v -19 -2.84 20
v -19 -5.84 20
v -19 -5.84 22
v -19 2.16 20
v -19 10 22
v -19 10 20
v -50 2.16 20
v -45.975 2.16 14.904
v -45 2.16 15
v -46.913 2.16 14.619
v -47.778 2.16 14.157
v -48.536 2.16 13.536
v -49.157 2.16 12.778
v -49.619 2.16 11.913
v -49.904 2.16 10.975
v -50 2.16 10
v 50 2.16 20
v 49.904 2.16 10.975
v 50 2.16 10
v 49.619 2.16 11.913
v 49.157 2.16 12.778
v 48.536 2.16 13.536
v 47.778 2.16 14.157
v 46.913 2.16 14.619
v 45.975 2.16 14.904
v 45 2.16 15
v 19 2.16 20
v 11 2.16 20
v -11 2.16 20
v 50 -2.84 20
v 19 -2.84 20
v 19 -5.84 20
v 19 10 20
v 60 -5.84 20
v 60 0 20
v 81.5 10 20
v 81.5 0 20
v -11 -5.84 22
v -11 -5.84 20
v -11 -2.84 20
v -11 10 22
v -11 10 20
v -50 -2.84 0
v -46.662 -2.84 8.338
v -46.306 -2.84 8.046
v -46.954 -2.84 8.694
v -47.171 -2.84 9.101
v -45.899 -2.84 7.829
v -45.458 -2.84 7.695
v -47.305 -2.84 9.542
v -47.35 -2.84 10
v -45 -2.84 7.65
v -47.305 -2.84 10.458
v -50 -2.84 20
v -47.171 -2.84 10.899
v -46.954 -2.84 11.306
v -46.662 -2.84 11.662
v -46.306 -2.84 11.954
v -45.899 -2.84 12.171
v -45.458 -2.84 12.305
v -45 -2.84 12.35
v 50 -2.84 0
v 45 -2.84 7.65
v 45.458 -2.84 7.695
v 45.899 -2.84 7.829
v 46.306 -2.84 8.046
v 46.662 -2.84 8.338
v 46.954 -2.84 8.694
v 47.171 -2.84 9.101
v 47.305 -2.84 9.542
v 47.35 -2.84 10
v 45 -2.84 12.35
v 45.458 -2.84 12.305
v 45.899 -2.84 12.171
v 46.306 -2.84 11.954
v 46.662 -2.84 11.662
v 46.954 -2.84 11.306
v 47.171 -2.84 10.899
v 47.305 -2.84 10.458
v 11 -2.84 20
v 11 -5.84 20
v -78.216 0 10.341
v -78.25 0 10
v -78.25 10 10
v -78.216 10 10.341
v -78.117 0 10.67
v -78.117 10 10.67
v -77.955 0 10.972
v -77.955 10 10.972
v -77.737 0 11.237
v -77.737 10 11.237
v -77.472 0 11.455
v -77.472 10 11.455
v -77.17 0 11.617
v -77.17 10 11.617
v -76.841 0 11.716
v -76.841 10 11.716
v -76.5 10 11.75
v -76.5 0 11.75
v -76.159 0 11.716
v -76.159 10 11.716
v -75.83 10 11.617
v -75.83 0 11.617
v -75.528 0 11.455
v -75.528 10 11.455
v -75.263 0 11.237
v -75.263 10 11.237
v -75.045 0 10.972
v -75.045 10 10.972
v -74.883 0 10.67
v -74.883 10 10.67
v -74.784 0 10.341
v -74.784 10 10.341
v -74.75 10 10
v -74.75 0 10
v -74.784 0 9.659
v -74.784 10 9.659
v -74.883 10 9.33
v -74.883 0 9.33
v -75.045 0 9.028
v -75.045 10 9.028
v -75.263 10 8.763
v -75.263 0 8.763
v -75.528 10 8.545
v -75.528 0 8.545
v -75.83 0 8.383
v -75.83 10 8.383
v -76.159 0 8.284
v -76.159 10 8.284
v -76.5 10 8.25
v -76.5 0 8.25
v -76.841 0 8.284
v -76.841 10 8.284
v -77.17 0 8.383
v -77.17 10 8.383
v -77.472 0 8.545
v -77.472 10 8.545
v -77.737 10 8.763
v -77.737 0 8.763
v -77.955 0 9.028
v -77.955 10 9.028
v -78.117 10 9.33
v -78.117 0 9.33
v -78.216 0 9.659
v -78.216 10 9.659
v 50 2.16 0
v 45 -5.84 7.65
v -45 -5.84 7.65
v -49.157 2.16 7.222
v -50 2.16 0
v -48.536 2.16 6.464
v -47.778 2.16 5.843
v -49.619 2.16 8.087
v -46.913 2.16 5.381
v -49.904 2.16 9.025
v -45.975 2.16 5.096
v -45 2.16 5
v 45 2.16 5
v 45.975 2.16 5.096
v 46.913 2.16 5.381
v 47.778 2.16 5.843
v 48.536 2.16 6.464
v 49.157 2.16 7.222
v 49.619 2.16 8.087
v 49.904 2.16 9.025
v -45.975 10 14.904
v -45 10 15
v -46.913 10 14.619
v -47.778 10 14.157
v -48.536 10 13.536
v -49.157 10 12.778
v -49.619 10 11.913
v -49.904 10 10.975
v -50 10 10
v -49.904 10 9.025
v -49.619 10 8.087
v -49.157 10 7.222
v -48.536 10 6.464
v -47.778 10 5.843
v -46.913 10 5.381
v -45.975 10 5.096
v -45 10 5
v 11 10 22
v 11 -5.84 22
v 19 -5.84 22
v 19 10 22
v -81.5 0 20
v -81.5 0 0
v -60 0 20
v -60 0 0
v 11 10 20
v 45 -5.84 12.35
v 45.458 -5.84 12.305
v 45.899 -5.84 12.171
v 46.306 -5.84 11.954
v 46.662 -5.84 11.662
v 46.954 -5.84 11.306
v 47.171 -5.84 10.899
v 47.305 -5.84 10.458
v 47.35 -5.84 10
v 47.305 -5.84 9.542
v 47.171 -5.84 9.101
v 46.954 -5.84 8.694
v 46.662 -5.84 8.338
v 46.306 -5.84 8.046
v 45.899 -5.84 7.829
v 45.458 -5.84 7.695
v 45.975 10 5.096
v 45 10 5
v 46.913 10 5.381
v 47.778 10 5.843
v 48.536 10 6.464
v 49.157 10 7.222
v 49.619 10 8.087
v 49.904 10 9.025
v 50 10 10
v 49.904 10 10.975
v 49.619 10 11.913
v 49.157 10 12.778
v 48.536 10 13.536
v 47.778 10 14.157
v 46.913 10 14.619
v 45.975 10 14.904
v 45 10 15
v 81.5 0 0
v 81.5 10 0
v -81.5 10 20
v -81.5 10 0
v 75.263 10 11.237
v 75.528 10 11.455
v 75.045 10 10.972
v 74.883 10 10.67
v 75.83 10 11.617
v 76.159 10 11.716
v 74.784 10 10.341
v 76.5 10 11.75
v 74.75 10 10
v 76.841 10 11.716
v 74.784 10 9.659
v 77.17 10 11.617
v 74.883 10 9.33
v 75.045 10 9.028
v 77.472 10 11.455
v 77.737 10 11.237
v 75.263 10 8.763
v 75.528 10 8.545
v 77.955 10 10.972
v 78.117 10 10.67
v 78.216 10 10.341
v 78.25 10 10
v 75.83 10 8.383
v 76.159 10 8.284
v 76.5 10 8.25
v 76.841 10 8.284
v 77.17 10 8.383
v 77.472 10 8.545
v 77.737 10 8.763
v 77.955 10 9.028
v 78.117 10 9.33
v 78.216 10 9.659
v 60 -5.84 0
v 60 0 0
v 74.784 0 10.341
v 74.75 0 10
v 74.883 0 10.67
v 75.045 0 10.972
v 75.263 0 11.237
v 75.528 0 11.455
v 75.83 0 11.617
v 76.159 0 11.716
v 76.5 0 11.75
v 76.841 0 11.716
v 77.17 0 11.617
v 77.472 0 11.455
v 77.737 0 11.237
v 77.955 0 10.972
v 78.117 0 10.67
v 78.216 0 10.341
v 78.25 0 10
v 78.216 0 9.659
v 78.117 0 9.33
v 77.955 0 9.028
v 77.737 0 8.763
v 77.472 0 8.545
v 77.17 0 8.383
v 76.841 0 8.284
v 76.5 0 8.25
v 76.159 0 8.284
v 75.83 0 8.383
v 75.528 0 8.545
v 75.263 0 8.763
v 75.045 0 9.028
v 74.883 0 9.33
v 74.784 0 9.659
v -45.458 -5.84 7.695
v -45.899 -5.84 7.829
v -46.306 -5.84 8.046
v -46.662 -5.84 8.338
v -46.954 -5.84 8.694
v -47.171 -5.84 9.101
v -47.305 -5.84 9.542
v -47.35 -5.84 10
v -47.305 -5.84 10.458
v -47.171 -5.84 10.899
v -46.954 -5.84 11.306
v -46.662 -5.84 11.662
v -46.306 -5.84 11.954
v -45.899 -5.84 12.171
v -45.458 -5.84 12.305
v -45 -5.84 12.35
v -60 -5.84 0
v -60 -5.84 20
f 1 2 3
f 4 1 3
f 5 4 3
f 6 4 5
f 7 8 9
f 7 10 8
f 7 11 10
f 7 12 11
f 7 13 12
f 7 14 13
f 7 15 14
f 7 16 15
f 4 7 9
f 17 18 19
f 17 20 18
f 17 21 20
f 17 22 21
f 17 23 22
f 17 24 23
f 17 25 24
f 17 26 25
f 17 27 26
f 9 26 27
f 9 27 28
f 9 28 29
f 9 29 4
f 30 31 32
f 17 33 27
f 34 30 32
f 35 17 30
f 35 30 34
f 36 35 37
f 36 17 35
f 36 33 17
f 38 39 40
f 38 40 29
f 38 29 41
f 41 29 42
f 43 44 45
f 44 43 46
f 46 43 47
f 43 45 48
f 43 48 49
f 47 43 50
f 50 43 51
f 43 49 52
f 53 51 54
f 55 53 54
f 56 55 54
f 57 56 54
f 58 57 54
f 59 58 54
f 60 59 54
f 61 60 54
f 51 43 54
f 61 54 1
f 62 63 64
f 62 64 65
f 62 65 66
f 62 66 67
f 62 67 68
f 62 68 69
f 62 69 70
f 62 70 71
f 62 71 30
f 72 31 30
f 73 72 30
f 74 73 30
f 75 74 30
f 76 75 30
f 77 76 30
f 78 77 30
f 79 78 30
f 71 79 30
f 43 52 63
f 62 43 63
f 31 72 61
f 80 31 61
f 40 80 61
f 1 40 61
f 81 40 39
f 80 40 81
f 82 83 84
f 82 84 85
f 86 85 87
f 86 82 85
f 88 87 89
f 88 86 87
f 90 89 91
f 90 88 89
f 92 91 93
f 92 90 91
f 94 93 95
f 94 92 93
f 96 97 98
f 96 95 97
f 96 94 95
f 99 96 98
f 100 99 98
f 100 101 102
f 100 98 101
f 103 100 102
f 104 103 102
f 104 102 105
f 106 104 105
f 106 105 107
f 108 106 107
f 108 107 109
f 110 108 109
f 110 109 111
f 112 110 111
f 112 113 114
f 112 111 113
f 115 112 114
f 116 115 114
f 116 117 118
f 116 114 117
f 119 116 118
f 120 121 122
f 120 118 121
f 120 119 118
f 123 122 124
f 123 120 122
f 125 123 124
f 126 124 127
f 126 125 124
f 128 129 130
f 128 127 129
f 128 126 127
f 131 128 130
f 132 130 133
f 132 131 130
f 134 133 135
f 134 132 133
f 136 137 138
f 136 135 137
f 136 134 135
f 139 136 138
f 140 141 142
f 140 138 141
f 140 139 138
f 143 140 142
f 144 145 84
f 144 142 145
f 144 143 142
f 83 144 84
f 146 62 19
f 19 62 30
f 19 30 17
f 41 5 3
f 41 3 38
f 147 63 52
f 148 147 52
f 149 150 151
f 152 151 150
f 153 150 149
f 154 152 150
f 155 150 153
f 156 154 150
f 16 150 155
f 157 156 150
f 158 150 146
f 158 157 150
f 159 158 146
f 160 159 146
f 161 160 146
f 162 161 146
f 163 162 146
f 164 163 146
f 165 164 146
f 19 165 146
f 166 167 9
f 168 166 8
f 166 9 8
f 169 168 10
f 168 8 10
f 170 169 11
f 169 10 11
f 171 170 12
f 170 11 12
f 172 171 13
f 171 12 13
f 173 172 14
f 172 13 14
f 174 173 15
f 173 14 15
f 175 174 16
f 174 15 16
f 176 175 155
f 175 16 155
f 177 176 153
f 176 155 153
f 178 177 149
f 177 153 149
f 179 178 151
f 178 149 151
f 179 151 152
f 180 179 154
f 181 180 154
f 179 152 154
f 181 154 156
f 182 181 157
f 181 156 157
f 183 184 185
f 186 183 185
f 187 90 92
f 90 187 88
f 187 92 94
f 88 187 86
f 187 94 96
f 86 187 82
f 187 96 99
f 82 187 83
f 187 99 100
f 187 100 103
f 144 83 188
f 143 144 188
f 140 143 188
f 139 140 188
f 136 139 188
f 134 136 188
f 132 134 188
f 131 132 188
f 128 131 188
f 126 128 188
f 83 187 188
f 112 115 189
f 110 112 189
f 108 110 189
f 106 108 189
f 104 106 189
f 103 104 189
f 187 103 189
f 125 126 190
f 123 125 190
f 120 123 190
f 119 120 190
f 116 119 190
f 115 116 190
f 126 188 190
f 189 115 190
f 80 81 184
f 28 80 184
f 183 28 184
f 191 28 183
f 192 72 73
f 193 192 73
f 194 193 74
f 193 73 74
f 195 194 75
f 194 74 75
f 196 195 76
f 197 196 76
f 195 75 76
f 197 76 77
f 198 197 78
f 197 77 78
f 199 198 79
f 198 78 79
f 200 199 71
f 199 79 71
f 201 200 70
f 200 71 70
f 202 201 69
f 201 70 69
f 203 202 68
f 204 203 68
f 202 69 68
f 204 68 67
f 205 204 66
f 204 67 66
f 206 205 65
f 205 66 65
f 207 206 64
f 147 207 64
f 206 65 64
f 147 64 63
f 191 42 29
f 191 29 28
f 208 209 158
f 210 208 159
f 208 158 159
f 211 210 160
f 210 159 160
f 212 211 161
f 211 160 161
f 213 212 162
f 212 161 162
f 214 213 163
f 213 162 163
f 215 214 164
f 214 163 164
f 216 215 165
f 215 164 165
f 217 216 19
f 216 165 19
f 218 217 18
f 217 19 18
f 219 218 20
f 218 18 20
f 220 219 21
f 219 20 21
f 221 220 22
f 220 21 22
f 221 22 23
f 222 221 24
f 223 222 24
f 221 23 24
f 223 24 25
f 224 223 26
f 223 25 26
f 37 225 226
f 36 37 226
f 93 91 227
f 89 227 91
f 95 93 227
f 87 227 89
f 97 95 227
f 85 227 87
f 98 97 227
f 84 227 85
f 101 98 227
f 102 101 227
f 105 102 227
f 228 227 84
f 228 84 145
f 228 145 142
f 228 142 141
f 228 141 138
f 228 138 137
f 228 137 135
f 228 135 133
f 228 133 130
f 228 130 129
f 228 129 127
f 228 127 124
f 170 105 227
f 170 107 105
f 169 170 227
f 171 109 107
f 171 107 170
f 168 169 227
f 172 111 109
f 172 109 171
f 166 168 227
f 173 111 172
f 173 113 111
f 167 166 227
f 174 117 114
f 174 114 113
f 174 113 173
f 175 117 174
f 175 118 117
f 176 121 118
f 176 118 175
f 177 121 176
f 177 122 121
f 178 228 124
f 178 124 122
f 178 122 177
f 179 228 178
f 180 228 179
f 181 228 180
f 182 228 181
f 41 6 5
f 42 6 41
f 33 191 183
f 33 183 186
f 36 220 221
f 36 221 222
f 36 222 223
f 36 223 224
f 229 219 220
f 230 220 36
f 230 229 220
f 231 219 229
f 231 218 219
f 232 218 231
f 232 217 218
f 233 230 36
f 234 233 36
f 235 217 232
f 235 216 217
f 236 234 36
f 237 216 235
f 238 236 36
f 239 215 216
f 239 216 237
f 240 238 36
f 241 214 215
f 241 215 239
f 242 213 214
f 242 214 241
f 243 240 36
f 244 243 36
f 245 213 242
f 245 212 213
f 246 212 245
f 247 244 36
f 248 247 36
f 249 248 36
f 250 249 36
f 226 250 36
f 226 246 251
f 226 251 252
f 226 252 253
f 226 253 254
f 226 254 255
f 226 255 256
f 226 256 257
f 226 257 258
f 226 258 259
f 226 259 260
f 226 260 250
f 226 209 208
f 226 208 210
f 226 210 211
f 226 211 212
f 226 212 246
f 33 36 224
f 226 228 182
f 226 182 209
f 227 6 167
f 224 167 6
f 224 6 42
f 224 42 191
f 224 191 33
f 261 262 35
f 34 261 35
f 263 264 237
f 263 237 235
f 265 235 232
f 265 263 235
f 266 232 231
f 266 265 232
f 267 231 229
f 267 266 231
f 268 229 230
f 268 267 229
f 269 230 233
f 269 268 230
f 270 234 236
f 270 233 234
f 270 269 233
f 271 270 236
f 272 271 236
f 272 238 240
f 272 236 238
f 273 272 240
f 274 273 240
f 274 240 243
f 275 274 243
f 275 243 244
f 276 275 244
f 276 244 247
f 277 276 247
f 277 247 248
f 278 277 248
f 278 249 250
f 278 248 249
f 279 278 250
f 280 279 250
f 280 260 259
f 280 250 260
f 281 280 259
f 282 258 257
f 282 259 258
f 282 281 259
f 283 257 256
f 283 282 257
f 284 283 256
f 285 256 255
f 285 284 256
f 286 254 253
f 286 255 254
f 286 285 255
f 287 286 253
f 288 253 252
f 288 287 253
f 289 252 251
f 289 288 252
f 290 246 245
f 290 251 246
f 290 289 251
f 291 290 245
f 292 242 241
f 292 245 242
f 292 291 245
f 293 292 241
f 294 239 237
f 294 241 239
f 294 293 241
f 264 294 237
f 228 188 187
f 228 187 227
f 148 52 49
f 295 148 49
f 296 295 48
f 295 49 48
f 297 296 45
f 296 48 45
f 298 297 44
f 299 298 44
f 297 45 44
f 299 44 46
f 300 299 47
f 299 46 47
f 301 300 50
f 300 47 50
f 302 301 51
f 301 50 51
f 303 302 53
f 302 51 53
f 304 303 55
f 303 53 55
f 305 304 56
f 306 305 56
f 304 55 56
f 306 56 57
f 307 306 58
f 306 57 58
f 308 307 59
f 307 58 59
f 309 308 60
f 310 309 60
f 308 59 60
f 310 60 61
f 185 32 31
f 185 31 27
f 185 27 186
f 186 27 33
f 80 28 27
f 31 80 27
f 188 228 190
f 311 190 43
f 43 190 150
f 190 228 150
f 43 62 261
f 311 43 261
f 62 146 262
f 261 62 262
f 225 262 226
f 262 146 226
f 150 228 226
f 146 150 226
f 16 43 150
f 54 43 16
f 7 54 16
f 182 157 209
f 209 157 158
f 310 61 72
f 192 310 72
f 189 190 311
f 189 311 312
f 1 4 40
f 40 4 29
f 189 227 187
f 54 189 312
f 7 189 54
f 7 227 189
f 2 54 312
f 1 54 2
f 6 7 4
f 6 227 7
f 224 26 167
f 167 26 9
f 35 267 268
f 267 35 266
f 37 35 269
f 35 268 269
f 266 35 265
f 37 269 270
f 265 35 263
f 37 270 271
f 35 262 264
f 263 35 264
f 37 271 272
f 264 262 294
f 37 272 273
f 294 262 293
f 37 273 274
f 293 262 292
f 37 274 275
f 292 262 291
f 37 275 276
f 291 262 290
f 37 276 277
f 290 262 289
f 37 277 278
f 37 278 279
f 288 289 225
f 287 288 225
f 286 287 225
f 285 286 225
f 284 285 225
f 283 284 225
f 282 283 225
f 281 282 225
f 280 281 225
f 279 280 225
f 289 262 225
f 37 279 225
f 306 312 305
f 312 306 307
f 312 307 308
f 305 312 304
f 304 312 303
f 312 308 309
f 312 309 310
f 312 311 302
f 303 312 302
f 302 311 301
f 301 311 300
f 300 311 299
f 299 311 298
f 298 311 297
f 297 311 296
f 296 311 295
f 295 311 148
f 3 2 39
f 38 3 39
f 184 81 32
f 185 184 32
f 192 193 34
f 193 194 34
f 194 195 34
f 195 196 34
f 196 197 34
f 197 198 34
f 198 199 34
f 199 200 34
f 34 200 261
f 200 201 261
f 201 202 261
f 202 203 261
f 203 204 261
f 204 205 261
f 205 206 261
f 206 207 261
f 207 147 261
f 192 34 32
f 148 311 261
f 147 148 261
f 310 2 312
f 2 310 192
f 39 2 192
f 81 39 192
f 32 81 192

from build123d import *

# Parameters (mm, degrees)
SKETCH1_W               = 163
SKETCH1_H               = 10
BOSS_EXTRUDE1_DEPTH     = 20
SKETCH4_W               = 120
SKETCH4_H               = 20
BOSS_EXTRUDE2_DEPTH     = 5.84
CUT_EXTRUDE1_REACH      = 86.512
SKETCH5_W               = 100
SKETCH5_H               = 5
CUT_EXTRUDE2_DEPTH      = 10
CUT_EXTRUDE3_DEPTH      = 86.399974239
CUT_EXTRUDE3_DEPTH_BACK = 86.399974239
SKETCH2_R               = 1.75
SKETCH7_W               = 8
SKETCH7_H               = 15.84
BOSS_EXTRUDE3_DEPTH     = 2


with BuildPart() as part:
    # Sketch1 → Boss-Extrude1 (new body)
    with BuildSketch(Plane.XY):
        with Locations((0, 5)):
            Rectangle(SKETCH1_W, SKETCH1_H)
    extrude(amount=BOSS_EXTRUDE1_DEPTH)

    # Sketch4 → Boss-Extrude2 (add)
    with BuildSketch(Plane.XZ):
        with Locations((0, 10)):
            Rectangle(SKETCH4_W, SKETCH4_H)
        with BuildLine():
            Line((-45, 12.35), (45, 12.35))
            ThreePointArc((45, 12.35), (47.35, 10), (45, 7.65))
            Line((45, 7.65), (-45, 7.65))
            ThreePointArc((-45, 7.65), (-47.35, 10), (-45, 12.35))
        make_face(mode=Mode.SUBTRACT)
    extrude(amount=BOSS_EXTRUDE2_DEPTH)

    # Cut-Extrude1: up to this face of the body (flat: up to its plane)
    cut_extrude1_end = Plane(part.part.faces().sort_by_distance((0, 2.618699159, 0))[0])
    # Sketch5 → Cut-Extrude1 (cut, up to the picked face)
    with BuildSketch(Plane.XY.offset(20), mode=Mode.PRIVATE) as cut_extrude1_sk1:
        with Locations((0, -0.34)):
            Rectangle(SKETCH5_W, SKETCH5_H)
    cut_extrude1_tool1 = split(extrude(cut_extrude1_sk1.sketch, amount=-CUT_EXTRUDE1_REACH, mode=Mode.PRIVATE), bisect_by=cut_extrude1_end, keep=Keep.BOTH, mode=Mode.PRIVATE)
    add(cut_extrude1_tool1.solids().sort_by(Axis((0, -0.34, 20), (0, 0, -1)))[0], mode=Mode.SUBTRACT)

    # Sketch6 → Cut-Extrude2 (cut)
    with BuildSketch(Plane.XZ.offset(-2.16)):
        with BuildLine():
            Line((-45, 5), (45, 5))
            ThreePointArc((45, 5), (50, 10), (45, 15))
            Line((45, 15), (-45, 15))
            ThreePointArc((-45, 15), (-50, 10), (-45, 5))
        make_face()
    extrude(amount=-CUT_EXTRUDE2_DEPTH, mode=Mode.SUBTRACT)

    # Sketch2 → Cut-Extrude3 (cut, two sides: drawn at the far end of the back side and taken through both)
    with BuildSketch(Plane(origin=(0, 10, 0), x_dir=(1, 0, 0), z_dir=(0, 1, 0)).offset(-CUT_EXTRUDE3_DEPTH_BACK)):
        with Locations(Location((76.5, -10, 0), (0, 0, 180))):
            Circle(SKETCH2_R)
        with Locations(Location((-76.5, -10, 0), (0, 0, 180))):
            Circle(SKETCH2_R)
    extrude(amount=CUT_EXTRUDE3_DEPTH + CUT_EXTRUDE3_DEPTH_BACK, mode=Mode.SUBTRACT)

    # Sketch7 → Boss-Extrude3 (add)
    with BuildSketch(Plane.XY.offset(20)):
        with Locations((-15, 2.08)):
            Rectangle(SKETCH7_W, SKETCH7_H)
        with Locations((15, 2.08)):
            Rectangle(SKETCH7_W, SKETCH7_H)
    extrude(amount=BOSS_EXTRUDE3_DEPTH)


solid = part.part
